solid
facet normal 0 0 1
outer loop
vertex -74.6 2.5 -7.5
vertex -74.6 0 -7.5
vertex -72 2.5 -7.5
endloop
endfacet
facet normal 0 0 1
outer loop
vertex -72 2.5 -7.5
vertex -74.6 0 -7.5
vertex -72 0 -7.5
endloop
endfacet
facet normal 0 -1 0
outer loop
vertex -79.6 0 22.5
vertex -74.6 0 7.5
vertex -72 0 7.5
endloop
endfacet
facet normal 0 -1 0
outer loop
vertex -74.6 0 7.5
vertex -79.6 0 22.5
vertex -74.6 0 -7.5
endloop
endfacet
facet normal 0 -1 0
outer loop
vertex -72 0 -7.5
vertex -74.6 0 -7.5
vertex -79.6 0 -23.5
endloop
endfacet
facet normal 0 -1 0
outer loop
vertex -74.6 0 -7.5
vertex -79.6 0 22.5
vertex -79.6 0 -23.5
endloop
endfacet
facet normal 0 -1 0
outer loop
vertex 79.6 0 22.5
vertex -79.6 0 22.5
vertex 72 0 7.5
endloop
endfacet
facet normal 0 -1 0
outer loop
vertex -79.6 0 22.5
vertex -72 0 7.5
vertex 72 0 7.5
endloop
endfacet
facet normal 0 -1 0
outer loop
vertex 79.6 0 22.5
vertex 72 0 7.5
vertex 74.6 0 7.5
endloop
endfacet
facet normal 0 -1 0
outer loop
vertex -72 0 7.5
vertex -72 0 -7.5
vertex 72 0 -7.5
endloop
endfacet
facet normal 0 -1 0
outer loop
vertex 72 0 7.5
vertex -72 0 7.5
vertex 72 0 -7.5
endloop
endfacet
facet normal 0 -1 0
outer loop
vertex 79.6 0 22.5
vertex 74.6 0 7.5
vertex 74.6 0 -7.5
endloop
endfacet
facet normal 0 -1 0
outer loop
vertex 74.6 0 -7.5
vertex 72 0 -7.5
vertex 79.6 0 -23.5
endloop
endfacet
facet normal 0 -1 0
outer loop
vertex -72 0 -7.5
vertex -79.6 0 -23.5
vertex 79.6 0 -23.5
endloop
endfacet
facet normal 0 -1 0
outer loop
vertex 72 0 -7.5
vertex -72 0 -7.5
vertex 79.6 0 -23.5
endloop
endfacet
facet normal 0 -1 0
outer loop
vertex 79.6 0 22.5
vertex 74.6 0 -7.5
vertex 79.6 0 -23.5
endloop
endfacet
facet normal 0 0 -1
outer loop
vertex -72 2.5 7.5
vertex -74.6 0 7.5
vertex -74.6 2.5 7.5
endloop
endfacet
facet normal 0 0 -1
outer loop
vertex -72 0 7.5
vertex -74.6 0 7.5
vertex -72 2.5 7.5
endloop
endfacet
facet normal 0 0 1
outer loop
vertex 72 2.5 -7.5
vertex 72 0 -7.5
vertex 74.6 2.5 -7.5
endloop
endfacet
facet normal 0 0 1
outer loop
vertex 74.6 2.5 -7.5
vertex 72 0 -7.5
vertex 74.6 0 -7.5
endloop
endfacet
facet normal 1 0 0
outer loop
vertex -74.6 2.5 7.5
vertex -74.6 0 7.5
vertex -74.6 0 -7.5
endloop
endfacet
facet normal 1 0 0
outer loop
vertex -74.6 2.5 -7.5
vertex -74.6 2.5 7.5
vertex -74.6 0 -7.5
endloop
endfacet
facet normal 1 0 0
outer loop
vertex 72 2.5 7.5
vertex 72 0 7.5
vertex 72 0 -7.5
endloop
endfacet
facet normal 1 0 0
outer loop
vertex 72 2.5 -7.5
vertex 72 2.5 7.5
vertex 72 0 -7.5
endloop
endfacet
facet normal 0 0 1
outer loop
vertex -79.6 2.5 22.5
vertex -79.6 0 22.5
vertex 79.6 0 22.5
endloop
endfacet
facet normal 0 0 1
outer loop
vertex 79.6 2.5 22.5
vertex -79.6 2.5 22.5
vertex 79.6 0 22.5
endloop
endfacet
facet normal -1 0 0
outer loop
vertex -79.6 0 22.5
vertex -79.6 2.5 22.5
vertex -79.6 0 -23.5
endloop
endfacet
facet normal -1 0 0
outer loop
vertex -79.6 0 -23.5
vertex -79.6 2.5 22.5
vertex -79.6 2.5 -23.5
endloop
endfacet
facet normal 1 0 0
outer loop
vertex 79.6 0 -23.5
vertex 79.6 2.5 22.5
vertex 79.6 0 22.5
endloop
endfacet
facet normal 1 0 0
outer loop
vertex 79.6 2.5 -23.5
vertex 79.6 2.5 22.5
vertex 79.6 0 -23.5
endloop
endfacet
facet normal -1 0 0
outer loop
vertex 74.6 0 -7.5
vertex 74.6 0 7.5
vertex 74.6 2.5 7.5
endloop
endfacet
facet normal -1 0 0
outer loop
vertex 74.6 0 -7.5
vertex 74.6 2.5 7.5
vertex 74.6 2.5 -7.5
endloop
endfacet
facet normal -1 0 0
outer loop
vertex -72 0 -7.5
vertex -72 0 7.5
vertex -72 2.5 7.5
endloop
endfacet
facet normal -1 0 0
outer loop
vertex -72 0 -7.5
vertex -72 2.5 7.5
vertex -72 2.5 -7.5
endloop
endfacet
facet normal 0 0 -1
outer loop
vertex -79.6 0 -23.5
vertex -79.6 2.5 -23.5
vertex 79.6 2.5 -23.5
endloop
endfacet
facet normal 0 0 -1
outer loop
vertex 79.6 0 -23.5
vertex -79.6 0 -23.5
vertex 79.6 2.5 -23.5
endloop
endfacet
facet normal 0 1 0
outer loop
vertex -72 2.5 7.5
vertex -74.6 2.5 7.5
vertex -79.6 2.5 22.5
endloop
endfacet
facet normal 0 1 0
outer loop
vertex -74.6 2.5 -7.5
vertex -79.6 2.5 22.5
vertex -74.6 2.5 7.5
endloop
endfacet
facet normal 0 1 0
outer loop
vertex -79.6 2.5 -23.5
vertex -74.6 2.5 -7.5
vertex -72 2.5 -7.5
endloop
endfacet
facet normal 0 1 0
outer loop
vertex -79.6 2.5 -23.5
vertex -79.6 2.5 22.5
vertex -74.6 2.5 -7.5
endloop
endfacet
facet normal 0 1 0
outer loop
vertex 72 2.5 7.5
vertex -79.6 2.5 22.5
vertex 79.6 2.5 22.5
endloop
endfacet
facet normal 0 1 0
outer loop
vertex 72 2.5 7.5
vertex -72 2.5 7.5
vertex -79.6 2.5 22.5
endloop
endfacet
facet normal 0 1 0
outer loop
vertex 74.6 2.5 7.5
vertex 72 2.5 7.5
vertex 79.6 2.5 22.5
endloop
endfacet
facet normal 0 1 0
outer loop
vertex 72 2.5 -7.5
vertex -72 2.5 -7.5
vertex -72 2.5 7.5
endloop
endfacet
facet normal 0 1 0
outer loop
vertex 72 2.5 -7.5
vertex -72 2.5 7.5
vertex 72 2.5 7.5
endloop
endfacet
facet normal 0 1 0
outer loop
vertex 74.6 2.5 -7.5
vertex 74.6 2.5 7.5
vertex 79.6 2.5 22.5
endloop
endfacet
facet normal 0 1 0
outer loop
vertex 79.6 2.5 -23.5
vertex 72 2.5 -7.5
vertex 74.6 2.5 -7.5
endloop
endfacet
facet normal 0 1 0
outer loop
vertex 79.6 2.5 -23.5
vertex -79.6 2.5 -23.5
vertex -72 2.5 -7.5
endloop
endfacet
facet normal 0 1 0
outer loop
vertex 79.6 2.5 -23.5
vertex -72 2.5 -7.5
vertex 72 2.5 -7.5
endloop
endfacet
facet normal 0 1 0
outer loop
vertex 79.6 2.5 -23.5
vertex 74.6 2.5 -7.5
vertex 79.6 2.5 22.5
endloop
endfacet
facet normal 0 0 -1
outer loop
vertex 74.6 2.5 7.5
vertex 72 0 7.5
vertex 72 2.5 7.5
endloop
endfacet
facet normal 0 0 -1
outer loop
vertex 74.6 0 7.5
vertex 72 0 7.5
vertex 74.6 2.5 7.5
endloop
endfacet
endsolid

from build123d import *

# Parameters (mm, degrees)
SKETCH1_W           = 159.2
SKETCH1_H           = 45
SKETCH1_W_2         = 2.6
SKETCH1_H_2         = 15
BOSS_EXTRUDE1_DEPTH = 2.5
SKETCH3_W           = 159.2
SKETCH3_H           = 10
BOSS_EXTRUDE3_DEPTH = 2.5
SKETCH4_W           = 159.2
SKETCH4_H           = 9
CUT_EXTRUDE1_DEPTH  = 3.5


with BuildPart() as part:
    # Sketch1 → Boss-Extrude1 (new body)
    with BuildSketch(Plane(origin=(0, 0, 0), x_dir=(1, 0, 0), z_dir=(0, 1, 0))):
        Rectangle(SKETCH1_W, SKETCH1_H)
        with Locations((-73.3, 0)):
            Rectangle(SKETCH1_W_2, SKETCH1_H_2, mode=Mode.SUBTRACT)
        with Locations((73.3, 0)):
            Rectangle(SKETCH1_W_2, SKETCH1_H_2, mode=Mode.SUBTRACT)
    extrude(amount=BOSS_EXTRUDE1_DEPTH)

    # Sketch3 → Boss-Extrude3 (add)
    with BuildSketch(Plane(origin=(0, 2.5, 0), x_dir=(1, 0, 0), z_dir=(0, 1, 0))):
        with Locations((0, 27.5)):
            Rectangle(SKETCH3_W, SKETCH3_H)
    extrude(amount=-BOSS_EXTRUDE3_DEPTH)

    # Sketch4 → Cut-Extrude1 (cut, through all)
    with BuildSketch(Plane(origin=(0, 2.5, 0), x_dir=(1, 0, 0), z_dir=(0, 1, 0))):
        with Locations((0, 28)):
            Rectangle(SKETCH4_W, SKETCH4_H)
    extrude(amount=-CUT_EXTRUDE1_DEPTH, mode=Mode.SUBTRACT)


solid = part.part
